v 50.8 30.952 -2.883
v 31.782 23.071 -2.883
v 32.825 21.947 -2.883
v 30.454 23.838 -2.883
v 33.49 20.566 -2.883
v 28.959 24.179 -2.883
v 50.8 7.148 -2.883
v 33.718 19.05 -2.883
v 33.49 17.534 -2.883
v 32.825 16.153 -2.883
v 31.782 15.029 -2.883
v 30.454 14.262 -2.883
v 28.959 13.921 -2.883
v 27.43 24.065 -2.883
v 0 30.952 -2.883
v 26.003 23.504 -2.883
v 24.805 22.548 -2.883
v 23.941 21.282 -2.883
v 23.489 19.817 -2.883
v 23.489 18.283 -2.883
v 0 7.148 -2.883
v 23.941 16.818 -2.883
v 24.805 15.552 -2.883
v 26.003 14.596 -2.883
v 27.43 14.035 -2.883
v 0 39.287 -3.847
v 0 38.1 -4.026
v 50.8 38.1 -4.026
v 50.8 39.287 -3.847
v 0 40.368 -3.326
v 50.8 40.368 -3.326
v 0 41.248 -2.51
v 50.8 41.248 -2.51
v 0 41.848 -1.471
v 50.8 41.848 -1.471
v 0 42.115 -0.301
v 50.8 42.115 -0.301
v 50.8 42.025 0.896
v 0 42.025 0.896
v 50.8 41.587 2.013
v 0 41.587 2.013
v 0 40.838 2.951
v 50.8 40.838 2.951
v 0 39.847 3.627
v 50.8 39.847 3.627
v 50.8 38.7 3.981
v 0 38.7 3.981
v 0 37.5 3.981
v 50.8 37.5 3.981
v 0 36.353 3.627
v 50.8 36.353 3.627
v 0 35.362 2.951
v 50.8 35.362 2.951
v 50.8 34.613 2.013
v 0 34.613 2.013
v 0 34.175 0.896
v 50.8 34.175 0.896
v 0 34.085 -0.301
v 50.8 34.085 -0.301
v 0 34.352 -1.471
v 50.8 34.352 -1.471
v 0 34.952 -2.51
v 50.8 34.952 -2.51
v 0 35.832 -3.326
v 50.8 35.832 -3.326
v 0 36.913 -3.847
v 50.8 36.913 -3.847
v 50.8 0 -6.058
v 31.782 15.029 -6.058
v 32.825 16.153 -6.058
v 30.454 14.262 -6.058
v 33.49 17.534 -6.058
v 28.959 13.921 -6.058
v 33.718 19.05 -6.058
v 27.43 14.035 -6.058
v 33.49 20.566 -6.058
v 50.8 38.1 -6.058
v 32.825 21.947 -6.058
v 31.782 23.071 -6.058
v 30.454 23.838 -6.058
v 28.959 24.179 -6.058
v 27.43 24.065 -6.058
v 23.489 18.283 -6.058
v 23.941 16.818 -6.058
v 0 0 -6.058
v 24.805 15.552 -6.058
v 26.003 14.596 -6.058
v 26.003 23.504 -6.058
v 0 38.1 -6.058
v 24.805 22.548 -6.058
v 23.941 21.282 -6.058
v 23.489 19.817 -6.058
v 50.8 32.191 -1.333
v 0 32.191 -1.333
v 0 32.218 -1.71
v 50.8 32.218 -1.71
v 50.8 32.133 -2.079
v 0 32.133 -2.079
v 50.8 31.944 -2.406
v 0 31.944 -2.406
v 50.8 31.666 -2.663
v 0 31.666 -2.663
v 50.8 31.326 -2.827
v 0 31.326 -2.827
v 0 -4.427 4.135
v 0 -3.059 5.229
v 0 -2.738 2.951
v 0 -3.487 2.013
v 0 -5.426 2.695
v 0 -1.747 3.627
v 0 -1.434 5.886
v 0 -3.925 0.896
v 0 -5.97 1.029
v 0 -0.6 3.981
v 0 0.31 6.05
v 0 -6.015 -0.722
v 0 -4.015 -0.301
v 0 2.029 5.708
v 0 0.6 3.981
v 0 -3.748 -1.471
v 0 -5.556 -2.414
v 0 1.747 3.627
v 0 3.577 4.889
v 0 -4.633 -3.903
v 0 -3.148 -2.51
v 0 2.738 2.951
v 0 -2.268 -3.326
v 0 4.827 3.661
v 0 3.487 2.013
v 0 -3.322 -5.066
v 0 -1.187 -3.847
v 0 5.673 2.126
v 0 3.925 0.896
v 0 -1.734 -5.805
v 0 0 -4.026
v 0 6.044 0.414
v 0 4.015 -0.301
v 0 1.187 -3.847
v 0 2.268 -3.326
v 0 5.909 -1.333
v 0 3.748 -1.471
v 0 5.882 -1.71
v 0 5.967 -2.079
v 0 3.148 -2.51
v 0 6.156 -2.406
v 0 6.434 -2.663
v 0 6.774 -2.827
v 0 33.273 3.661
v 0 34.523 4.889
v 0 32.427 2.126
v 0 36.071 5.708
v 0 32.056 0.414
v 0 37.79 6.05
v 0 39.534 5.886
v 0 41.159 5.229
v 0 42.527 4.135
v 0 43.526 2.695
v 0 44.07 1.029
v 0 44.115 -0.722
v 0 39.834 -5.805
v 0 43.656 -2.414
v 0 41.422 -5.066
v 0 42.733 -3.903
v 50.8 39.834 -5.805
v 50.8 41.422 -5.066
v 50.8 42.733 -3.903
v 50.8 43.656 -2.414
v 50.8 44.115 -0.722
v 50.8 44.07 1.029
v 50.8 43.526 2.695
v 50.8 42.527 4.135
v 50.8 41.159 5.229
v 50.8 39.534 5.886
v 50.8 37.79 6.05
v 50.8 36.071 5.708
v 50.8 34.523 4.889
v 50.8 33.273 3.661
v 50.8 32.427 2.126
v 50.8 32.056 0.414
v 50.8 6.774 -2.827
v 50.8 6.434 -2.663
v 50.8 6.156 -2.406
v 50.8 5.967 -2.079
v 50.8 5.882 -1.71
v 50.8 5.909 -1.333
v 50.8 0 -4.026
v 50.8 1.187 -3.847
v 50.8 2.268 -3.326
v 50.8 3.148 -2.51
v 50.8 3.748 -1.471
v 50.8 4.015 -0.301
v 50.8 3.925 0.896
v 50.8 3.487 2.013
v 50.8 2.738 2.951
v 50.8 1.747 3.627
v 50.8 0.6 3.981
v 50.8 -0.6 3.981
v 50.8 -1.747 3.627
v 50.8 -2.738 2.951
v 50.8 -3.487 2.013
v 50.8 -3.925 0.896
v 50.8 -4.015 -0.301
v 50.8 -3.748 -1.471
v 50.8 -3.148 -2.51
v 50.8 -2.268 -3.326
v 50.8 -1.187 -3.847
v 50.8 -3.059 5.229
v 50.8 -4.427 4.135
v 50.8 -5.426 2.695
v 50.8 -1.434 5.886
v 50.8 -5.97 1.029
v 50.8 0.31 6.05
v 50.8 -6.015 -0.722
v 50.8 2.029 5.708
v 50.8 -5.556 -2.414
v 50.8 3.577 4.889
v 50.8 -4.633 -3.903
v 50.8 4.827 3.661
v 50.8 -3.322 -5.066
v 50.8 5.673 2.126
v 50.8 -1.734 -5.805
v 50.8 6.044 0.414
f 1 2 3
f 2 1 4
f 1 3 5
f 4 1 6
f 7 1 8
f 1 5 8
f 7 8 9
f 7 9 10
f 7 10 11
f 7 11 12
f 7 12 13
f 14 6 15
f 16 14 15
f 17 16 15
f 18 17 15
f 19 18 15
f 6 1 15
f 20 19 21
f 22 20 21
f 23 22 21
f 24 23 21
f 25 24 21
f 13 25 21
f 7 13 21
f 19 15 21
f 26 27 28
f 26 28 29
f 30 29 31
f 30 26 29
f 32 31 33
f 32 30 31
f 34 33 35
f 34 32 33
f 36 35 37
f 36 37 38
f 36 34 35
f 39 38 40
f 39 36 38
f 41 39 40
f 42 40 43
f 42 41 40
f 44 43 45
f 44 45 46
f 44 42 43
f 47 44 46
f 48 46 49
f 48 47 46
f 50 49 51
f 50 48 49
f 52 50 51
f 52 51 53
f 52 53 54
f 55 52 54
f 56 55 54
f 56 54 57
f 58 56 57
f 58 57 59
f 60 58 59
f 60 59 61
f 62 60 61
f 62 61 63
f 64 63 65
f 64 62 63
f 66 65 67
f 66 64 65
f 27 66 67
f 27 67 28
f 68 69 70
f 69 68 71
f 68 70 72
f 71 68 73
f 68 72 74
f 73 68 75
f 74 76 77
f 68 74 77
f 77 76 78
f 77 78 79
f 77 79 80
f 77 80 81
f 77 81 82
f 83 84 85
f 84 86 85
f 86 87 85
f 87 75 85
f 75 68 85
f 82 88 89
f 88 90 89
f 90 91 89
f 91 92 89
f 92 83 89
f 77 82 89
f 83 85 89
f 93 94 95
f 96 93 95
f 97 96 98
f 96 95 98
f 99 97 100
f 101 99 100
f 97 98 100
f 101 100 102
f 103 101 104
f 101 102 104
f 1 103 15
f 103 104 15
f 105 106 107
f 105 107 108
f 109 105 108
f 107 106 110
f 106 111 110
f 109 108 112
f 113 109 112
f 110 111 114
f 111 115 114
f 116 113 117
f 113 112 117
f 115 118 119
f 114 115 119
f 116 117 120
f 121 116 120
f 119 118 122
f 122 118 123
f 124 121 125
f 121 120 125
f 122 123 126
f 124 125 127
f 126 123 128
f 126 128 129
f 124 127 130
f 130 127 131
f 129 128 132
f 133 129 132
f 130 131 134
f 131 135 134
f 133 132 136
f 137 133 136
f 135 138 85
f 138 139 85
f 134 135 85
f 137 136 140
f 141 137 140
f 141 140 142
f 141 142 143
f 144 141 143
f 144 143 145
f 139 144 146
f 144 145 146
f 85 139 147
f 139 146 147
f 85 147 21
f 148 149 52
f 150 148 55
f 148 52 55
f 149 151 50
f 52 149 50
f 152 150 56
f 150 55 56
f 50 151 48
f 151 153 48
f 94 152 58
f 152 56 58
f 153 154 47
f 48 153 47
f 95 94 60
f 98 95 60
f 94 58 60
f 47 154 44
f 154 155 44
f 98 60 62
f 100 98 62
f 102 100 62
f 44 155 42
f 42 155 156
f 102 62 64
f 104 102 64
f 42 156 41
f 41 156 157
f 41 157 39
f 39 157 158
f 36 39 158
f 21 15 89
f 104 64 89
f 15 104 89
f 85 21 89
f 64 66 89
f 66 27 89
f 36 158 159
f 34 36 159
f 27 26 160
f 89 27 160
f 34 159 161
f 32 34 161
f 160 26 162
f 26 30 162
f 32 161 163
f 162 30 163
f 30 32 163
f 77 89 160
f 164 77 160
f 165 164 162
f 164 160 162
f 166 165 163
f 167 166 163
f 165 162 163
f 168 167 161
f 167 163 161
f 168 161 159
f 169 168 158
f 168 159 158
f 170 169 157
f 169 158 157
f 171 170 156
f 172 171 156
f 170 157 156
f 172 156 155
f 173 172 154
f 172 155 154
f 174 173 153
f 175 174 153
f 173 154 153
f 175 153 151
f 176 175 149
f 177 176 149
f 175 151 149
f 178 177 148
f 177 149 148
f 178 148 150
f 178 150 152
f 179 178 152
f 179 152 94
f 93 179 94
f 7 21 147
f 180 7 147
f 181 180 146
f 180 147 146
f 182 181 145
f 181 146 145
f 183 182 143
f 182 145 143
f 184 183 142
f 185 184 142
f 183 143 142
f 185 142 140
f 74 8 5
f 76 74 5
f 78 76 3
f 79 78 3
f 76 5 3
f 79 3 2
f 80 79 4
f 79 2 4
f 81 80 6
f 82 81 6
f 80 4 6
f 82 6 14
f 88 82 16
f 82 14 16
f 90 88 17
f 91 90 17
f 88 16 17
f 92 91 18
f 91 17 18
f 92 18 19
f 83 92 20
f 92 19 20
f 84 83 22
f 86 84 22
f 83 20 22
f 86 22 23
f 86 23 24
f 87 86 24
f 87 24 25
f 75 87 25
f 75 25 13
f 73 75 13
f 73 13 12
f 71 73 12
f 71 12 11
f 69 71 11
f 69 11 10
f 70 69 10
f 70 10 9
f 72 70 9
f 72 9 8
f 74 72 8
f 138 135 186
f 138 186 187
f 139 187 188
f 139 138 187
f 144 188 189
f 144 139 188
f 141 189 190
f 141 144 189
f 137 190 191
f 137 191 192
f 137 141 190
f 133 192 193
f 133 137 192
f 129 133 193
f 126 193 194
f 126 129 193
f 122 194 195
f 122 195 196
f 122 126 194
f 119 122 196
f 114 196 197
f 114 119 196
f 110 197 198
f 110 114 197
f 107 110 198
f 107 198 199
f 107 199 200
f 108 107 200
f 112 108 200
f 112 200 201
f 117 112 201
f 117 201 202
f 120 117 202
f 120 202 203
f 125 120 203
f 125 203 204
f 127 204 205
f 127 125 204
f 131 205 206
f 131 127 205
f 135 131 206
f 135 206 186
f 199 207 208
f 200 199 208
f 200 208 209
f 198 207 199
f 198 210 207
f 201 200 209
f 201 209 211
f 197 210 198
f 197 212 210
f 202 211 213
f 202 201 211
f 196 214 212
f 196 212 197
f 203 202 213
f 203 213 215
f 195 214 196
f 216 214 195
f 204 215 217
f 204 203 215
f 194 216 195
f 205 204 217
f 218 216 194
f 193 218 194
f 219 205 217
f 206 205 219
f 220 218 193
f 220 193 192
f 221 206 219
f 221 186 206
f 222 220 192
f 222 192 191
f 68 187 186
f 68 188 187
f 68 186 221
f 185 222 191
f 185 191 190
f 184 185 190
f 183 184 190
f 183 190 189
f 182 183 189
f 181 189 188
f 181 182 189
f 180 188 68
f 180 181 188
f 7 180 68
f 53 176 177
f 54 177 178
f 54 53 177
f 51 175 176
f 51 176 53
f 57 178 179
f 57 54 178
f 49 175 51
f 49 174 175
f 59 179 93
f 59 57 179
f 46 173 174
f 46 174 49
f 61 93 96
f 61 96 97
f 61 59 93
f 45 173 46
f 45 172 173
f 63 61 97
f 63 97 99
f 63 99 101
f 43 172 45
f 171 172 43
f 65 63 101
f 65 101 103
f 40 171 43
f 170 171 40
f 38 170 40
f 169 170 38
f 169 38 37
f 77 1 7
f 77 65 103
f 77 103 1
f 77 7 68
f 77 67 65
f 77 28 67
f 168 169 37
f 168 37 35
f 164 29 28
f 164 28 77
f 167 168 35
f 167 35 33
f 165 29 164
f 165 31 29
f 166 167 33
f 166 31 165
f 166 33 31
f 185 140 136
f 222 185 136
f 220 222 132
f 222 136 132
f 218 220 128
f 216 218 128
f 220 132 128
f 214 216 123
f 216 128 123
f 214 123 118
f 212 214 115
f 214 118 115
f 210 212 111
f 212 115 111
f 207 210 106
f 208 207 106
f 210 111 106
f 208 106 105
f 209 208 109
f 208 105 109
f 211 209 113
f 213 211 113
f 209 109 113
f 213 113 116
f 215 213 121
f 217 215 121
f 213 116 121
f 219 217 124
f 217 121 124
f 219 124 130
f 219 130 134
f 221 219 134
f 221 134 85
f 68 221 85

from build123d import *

# Parameters (mm, degrees)
SKETCH1_R           = 4.0259
BOSS_EXTRUDE1_DEPTH = 50.8
SKETCH7_R           = 5.1435
CUT_EXTRUDE3_DEPTH  = 68.900648282


with BuildPart() as part:
    # Sketch1 → Boss-Extrude1 (new body)
    with BuildSketch(Plane(origin=(0, 0, 0), x_dir=(0, 0, -1), z_dir=(1, 0, 0))):
        with BuildLine():
            Line((2.8829, 30.951806382), (2.8829, 7.148193618))
            ThreePointArc((2.8829, 7.148193618), (2.405961877, 6.156249638), (1.333367938, 5.909338572))
            ThreePointArc((1.333367938, 5.909338572), (-4.731572785, -3.782905152), (6.0579, 0))
            Line((6.0579, 0), (6.0579, 38.1))
            ThreePointArc((6.0579, 38.1), (-4.731572785, 41.882905152), (1.333367938, 32.190661428))
            ThreePointArc((1.333367938, 32.190661428), (2.405961877, 31.943750362), (2.8829, 30.951806382))
        make_face()
        Circle(SKETCH1_R, mode=Mode.SUBTRACT)
        with Locations((0, 38.1)):
            Circle(SKETCH1_R, mode=Mode.SUBTRACT)
    extrude(amount=BOSS_EXTRUDE1_DEPTH)

    # Sketch7 → Cut-Extrude3 (cut, through all)
    with BuildSketch(Plane.XY.offset(-2.8829)):
        with Locations((28.575, 19.05)):
            Circle(SKETCH7_R)
    extrude(amount=-CUT_EXTRUDE3_DEPTH, mode=Mode.SUBTRACT)


solid = part.part
